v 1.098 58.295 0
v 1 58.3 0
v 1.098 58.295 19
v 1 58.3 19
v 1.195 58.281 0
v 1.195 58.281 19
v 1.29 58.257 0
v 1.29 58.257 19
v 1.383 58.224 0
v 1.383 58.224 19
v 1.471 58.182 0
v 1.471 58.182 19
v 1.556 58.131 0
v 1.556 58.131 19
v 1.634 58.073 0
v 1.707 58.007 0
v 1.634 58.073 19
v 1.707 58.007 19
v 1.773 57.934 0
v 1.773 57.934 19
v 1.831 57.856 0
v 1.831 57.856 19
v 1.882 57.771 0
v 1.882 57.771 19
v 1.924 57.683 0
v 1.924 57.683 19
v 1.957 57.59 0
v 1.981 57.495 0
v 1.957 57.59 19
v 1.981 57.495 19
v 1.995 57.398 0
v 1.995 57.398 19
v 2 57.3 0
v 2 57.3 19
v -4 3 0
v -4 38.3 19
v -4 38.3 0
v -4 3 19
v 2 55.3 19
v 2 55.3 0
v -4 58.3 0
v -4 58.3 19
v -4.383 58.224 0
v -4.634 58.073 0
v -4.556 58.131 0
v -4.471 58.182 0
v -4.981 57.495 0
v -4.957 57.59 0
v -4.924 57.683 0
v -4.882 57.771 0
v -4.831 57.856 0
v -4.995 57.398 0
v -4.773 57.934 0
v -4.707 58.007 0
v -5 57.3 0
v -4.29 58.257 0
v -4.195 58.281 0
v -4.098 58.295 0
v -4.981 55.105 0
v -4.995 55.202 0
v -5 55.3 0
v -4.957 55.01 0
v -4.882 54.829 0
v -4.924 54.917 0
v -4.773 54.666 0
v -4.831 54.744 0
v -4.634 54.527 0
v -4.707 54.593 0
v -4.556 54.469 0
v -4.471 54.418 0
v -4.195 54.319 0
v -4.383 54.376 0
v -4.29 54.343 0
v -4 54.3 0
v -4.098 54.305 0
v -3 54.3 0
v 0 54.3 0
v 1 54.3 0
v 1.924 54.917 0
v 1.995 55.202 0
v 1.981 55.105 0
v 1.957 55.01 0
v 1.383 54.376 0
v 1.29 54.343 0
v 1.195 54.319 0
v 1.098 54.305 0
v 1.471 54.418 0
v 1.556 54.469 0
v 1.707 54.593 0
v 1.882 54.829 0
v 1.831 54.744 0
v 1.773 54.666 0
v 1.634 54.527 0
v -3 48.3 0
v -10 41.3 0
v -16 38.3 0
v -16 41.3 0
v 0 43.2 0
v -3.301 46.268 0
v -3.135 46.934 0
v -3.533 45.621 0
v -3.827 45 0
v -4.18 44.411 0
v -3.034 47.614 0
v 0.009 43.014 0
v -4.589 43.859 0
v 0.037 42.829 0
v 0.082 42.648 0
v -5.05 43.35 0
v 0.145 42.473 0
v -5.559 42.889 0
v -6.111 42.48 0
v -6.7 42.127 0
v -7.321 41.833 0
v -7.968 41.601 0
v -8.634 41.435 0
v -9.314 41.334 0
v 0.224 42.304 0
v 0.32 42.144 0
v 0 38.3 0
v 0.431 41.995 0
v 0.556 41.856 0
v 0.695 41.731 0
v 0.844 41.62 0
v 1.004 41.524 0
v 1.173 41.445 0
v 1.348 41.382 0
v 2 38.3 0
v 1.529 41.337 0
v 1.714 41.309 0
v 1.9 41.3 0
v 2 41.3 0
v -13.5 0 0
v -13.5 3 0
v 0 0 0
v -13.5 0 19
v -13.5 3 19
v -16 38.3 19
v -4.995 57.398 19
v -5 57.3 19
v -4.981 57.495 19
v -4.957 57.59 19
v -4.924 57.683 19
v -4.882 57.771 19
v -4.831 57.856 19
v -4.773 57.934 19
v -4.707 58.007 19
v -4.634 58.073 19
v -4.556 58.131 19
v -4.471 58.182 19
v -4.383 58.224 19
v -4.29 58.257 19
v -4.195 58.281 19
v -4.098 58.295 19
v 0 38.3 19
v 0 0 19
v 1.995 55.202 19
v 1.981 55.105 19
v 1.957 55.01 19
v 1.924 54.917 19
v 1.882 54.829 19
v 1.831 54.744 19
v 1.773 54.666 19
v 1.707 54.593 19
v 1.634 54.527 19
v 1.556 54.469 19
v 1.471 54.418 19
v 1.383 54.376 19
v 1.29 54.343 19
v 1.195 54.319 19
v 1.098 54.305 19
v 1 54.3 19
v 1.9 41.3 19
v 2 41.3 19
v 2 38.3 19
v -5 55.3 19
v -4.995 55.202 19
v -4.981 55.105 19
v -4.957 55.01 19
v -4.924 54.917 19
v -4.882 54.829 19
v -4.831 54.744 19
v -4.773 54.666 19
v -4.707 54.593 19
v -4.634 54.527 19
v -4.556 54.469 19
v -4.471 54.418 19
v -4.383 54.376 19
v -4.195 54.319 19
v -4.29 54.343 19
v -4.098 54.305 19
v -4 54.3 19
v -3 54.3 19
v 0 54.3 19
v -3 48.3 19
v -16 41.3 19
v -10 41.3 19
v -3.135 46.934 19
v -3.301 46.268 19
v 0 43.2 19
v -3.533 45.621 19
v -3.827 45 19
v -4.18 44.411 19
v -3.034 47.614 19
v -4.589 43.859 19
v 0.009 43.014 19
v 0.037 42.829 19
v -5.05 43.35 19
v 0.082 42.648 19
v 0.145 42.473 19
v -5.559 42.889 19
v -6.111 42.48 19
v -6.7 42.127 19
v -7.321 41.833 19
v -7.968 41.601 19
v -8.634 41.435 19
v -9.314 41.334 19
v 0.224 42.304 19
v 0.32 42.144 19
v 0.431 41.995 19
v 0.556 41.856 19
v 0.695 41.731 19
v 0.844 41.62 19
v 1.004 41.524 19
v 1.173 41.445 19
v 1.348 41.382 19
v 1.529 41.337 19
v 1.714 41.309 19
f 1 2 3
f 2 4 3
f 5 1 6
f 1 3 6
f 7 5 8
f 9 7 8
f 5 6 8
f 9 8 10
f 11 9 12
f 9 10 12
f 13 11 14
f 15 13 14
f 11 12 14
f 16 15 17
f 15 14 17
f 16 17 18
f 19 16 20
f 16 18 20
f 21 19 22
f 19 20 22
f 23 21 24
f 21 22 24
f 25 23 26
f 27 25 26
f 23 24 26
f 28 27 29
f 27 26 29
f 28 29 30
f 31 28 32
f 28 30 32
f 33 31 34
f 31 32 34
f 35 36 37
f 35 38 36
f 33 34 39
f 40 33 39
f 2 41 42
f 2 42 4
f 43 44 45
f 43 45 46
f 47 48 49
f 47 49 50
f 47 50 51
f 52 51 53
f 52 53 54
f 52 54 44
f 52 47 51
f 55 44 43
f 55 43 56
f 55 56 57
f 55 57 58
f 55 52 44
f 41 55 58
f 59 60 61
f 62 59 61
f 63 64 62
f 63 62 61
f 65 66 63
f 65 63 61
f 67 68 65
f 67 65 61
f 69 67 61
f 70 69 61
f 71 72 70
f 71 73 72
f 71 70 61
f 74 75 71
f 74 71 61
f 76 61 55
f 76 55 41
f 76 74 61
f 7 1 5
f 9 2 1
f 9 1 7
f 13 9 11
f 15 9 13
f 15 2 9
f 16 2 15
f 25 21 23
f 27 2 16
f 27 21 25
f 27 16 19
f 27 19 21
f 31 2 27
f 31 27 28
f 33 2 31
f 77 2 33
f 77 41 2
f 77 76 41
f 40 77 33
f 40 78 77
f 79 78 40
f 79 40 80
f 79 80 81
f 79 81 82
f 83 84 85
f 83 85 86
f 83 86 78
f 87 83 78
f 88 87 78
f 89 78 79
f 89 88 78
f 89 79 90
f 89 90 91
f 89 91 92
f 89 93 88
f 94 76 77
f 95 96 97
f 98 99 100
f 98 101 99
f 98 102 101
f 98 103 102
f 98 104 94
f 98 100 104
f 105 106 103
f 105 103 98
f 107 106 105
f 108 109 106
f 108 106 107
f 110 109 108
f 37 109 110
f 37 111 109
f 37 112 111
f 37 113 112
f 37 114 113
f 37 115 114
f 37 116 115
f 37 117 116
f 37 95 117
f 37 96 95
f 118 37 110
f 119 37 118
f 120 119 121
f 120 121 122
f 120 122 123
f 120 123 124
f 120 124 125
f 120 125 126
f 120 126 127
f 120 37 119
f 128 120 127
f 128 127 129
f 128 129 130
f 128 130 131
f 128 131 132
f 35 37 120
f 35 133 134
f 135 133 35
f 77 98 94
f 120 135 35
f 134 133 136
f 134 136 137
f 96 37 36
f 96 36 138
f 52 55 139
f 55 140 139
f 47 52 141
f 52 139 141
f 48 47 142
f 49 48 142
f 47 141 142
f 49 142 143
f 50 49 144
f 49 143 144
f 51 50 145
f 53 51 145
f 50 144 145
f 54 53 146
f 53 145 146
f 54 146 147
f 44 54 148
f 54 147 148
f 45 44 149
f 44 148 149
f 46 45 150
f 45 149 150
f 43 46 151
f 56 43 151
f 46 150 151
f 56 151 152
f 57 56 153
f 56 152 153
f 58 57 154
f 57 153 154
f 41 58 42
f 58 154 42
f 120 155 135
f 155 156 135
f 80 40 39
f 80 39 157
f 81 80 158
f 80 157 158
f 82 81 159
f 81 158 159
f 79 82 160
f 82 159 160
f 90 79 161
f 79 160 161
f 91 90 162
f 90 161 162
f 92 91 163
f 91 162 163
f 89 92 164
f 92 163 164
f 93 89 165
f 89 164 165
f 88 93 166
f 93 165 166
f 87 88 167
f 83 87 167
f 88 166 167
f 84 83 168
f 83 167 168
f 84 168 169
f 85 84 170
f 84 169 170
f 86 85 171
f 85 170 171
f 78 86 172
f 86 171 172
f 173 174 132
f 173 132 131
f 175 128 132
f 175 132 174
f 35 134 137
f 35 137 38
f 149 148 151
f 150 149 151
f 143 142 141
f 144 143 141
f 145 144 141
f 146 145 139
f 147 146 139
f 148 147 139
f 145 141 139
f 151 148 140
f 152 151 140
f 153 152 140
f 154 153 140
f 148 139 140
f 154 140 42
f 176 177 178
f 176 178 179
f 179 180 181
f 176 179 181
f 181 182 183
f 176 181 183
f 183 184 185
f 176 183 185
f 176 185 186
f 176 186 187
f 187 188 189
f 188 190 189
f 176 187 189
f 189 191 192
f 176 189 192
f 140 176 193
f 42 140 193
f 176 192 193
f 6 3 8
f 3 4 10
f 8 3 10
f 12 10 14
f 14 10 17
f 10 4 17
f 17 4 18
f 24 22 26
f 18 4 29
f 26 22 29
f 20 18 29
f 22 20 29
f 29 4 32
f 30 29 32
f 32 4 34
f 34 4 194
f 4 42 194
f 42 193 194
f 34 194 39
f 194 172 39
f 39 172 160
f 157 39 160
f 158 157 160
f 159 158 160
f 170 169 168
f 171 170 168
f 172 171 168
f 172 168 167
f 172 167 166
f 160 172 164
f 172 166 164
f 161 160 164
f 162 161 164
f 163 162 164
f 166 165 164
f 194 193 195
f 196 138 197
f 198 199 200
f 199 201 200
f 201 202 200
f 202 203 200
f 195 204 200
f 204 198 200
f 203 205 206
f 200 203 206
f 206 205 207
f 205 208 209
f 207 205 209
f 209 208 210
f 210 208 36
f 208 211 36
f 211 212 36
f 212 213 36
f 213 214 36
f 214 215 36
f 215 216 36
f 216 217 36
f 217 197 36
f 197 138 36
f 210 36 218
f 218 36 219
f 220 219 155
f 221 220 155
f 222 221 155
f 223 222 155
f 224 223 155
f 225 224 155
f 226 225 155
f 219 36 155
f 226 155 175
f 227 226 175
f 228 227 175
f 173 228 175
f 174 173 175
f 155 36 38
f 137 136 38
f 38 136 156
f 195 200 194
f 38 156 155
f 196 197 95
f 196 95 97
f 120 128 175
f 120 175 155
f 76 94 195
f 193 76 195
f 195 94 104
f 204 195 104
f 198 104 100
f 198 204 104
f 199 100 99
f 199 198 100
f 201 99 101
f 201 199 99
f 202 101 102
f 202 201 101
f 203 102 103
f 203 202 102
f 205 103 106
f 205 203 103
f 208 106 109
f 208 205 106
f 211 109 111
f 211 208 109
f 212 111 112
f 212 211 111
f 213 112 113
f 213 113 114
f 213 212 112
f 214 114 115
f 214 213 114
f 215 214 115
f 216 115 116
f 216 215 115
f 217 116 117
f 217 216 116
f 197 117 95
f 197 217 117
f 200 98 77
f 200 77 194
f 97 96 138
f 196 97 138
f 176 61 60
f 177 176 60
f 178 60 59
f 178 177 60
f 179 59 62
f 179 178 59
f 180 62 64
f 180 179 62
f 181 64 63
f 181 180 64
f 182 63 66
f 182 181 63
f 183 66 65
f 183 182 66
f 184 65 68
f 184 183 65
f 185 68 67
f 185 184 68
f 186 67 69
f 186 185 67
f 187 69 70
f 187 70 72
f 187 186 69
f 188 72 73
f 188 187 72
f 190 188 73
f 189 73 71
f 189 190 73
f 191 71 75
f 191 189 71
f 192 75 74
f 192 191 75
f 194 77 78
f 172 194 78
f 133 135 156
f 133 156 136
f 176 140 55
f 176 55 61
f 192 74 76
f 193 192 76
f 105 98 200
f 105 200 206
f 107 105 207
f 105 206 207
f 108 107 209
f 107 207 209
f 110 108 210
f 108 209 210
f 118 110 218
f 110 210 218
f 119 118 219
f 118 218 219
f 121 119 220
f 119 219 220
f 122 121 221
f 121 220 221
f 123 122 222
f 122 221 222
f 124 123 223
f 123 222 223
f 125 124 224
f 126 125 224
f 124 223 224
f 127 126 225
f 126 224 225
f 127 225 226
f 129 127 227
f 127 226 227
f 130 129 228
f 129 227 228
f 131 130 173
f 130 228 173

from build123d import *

# Parameters (mm, degrees)
PAD121_DEPTH   = 19
PAD121_FACE5_W = 4
PAD121_FACE5_H = 19
PAD127_DEPTH   = 0.3
SKETCH126_W    = 18
SKETCH126_H    = 19
PAD128_DEPTH   = 3
SKETCH127_W    = 3
SKETCH127_H    = 19
PAD129_DEPTH   = 15
SKETCH128_W    = 7
SKETCH128_H    = 4
PAD130_DEPTH   = 19
FILLET056_R    = 1
FILLET057_R    = 1.9
FILLET058_R    = 7


with BuildPart() as part:
    # Sketch119 → Pad121 (new body)
    with BuildSketch(Plane.XY):
        Polygon((0, 0), (-13.5, 0), (-13.5, 3), (-4, 3), (-4, 38), (0, 38), align=None)
    extrude(amount=PAD121_DEPTH)

    # Pad121 Face5 → Pad127 (add)
    with BuildSketch(Plane(origin=(-2, 38, 9.5), x_dir=(1, 0, 0), z_dir=(0, 1, 0))):
        Rectangle(PAD121_FACE5_W, PAD121_FACE5_H)
    extrude(amount=PAD127_DEPTH)

    # Sketch126 (on Face5 of Pad127) → Pad128 (join)
    with BuildSketch(Plane(origin=(0, 38.3, 0), x_dir=(-1, 0, 0), z_dir=(0, 1, 0))):
        with Locations((7, 9.5)):
            Rectangle(SKETCH126_W, SKETCH126_H)
    extrude(amount=PAD128_DEPTH)

    # Sketch127 (on Face3 of Pad128) → Pad129 (join)
    with BuildSketch(Plane(origin=(0, 41.3, 0), x_dir=(-1, 0, 0), z_dir=(0, 1, 0))):
        with Locations((1.5, 9.5)):
            Rectangle(SKETCH127_W, SKETCH127_H)
    extrude(amount=PAD129_DEPTH)

    # Sketch128 (on Face15 of Pad129) → Pad130 (join)
    with BuildSketch(Plane(origin=(0, 0, 0), x_dir=(1, 0, 0), z_dir=(0, 0, -1))):
        with Locations((-1.5, -56.3)):
            Rectangle(SKETCH128_W, SKETCH128_H)
    extrude(amount=-PAD130_DEPTH)

    # Fillet056
    fillet056_edges = [part.edges().sort_by_distance(p)[0] for p in [
        (2, 58.3, 9.5),
        (2, 54.3, 9.5),
        (-5, 58.3, 9.5),
        (-5, 54.3, 9.5),
    ]]
    fillet(fillet056_edges, radius=FILLET056_R)

    # Fillet057
    fillet057_edges = [part.edges().sort_by_distance(p)[0] for p in [
        (0, 41.3, 9.5),
    ]]
    fillet(fillet057_edges, radius=FILLET057_R)

    # Fillet058
    fillet058_edges = [part.edges().sort_by_distance(p)[0] for p in [
        (-3, 41.3, 9.5),
    ]]
    fillet(fillet058_edges, radius=FILLET058_R)


solid = part.part
